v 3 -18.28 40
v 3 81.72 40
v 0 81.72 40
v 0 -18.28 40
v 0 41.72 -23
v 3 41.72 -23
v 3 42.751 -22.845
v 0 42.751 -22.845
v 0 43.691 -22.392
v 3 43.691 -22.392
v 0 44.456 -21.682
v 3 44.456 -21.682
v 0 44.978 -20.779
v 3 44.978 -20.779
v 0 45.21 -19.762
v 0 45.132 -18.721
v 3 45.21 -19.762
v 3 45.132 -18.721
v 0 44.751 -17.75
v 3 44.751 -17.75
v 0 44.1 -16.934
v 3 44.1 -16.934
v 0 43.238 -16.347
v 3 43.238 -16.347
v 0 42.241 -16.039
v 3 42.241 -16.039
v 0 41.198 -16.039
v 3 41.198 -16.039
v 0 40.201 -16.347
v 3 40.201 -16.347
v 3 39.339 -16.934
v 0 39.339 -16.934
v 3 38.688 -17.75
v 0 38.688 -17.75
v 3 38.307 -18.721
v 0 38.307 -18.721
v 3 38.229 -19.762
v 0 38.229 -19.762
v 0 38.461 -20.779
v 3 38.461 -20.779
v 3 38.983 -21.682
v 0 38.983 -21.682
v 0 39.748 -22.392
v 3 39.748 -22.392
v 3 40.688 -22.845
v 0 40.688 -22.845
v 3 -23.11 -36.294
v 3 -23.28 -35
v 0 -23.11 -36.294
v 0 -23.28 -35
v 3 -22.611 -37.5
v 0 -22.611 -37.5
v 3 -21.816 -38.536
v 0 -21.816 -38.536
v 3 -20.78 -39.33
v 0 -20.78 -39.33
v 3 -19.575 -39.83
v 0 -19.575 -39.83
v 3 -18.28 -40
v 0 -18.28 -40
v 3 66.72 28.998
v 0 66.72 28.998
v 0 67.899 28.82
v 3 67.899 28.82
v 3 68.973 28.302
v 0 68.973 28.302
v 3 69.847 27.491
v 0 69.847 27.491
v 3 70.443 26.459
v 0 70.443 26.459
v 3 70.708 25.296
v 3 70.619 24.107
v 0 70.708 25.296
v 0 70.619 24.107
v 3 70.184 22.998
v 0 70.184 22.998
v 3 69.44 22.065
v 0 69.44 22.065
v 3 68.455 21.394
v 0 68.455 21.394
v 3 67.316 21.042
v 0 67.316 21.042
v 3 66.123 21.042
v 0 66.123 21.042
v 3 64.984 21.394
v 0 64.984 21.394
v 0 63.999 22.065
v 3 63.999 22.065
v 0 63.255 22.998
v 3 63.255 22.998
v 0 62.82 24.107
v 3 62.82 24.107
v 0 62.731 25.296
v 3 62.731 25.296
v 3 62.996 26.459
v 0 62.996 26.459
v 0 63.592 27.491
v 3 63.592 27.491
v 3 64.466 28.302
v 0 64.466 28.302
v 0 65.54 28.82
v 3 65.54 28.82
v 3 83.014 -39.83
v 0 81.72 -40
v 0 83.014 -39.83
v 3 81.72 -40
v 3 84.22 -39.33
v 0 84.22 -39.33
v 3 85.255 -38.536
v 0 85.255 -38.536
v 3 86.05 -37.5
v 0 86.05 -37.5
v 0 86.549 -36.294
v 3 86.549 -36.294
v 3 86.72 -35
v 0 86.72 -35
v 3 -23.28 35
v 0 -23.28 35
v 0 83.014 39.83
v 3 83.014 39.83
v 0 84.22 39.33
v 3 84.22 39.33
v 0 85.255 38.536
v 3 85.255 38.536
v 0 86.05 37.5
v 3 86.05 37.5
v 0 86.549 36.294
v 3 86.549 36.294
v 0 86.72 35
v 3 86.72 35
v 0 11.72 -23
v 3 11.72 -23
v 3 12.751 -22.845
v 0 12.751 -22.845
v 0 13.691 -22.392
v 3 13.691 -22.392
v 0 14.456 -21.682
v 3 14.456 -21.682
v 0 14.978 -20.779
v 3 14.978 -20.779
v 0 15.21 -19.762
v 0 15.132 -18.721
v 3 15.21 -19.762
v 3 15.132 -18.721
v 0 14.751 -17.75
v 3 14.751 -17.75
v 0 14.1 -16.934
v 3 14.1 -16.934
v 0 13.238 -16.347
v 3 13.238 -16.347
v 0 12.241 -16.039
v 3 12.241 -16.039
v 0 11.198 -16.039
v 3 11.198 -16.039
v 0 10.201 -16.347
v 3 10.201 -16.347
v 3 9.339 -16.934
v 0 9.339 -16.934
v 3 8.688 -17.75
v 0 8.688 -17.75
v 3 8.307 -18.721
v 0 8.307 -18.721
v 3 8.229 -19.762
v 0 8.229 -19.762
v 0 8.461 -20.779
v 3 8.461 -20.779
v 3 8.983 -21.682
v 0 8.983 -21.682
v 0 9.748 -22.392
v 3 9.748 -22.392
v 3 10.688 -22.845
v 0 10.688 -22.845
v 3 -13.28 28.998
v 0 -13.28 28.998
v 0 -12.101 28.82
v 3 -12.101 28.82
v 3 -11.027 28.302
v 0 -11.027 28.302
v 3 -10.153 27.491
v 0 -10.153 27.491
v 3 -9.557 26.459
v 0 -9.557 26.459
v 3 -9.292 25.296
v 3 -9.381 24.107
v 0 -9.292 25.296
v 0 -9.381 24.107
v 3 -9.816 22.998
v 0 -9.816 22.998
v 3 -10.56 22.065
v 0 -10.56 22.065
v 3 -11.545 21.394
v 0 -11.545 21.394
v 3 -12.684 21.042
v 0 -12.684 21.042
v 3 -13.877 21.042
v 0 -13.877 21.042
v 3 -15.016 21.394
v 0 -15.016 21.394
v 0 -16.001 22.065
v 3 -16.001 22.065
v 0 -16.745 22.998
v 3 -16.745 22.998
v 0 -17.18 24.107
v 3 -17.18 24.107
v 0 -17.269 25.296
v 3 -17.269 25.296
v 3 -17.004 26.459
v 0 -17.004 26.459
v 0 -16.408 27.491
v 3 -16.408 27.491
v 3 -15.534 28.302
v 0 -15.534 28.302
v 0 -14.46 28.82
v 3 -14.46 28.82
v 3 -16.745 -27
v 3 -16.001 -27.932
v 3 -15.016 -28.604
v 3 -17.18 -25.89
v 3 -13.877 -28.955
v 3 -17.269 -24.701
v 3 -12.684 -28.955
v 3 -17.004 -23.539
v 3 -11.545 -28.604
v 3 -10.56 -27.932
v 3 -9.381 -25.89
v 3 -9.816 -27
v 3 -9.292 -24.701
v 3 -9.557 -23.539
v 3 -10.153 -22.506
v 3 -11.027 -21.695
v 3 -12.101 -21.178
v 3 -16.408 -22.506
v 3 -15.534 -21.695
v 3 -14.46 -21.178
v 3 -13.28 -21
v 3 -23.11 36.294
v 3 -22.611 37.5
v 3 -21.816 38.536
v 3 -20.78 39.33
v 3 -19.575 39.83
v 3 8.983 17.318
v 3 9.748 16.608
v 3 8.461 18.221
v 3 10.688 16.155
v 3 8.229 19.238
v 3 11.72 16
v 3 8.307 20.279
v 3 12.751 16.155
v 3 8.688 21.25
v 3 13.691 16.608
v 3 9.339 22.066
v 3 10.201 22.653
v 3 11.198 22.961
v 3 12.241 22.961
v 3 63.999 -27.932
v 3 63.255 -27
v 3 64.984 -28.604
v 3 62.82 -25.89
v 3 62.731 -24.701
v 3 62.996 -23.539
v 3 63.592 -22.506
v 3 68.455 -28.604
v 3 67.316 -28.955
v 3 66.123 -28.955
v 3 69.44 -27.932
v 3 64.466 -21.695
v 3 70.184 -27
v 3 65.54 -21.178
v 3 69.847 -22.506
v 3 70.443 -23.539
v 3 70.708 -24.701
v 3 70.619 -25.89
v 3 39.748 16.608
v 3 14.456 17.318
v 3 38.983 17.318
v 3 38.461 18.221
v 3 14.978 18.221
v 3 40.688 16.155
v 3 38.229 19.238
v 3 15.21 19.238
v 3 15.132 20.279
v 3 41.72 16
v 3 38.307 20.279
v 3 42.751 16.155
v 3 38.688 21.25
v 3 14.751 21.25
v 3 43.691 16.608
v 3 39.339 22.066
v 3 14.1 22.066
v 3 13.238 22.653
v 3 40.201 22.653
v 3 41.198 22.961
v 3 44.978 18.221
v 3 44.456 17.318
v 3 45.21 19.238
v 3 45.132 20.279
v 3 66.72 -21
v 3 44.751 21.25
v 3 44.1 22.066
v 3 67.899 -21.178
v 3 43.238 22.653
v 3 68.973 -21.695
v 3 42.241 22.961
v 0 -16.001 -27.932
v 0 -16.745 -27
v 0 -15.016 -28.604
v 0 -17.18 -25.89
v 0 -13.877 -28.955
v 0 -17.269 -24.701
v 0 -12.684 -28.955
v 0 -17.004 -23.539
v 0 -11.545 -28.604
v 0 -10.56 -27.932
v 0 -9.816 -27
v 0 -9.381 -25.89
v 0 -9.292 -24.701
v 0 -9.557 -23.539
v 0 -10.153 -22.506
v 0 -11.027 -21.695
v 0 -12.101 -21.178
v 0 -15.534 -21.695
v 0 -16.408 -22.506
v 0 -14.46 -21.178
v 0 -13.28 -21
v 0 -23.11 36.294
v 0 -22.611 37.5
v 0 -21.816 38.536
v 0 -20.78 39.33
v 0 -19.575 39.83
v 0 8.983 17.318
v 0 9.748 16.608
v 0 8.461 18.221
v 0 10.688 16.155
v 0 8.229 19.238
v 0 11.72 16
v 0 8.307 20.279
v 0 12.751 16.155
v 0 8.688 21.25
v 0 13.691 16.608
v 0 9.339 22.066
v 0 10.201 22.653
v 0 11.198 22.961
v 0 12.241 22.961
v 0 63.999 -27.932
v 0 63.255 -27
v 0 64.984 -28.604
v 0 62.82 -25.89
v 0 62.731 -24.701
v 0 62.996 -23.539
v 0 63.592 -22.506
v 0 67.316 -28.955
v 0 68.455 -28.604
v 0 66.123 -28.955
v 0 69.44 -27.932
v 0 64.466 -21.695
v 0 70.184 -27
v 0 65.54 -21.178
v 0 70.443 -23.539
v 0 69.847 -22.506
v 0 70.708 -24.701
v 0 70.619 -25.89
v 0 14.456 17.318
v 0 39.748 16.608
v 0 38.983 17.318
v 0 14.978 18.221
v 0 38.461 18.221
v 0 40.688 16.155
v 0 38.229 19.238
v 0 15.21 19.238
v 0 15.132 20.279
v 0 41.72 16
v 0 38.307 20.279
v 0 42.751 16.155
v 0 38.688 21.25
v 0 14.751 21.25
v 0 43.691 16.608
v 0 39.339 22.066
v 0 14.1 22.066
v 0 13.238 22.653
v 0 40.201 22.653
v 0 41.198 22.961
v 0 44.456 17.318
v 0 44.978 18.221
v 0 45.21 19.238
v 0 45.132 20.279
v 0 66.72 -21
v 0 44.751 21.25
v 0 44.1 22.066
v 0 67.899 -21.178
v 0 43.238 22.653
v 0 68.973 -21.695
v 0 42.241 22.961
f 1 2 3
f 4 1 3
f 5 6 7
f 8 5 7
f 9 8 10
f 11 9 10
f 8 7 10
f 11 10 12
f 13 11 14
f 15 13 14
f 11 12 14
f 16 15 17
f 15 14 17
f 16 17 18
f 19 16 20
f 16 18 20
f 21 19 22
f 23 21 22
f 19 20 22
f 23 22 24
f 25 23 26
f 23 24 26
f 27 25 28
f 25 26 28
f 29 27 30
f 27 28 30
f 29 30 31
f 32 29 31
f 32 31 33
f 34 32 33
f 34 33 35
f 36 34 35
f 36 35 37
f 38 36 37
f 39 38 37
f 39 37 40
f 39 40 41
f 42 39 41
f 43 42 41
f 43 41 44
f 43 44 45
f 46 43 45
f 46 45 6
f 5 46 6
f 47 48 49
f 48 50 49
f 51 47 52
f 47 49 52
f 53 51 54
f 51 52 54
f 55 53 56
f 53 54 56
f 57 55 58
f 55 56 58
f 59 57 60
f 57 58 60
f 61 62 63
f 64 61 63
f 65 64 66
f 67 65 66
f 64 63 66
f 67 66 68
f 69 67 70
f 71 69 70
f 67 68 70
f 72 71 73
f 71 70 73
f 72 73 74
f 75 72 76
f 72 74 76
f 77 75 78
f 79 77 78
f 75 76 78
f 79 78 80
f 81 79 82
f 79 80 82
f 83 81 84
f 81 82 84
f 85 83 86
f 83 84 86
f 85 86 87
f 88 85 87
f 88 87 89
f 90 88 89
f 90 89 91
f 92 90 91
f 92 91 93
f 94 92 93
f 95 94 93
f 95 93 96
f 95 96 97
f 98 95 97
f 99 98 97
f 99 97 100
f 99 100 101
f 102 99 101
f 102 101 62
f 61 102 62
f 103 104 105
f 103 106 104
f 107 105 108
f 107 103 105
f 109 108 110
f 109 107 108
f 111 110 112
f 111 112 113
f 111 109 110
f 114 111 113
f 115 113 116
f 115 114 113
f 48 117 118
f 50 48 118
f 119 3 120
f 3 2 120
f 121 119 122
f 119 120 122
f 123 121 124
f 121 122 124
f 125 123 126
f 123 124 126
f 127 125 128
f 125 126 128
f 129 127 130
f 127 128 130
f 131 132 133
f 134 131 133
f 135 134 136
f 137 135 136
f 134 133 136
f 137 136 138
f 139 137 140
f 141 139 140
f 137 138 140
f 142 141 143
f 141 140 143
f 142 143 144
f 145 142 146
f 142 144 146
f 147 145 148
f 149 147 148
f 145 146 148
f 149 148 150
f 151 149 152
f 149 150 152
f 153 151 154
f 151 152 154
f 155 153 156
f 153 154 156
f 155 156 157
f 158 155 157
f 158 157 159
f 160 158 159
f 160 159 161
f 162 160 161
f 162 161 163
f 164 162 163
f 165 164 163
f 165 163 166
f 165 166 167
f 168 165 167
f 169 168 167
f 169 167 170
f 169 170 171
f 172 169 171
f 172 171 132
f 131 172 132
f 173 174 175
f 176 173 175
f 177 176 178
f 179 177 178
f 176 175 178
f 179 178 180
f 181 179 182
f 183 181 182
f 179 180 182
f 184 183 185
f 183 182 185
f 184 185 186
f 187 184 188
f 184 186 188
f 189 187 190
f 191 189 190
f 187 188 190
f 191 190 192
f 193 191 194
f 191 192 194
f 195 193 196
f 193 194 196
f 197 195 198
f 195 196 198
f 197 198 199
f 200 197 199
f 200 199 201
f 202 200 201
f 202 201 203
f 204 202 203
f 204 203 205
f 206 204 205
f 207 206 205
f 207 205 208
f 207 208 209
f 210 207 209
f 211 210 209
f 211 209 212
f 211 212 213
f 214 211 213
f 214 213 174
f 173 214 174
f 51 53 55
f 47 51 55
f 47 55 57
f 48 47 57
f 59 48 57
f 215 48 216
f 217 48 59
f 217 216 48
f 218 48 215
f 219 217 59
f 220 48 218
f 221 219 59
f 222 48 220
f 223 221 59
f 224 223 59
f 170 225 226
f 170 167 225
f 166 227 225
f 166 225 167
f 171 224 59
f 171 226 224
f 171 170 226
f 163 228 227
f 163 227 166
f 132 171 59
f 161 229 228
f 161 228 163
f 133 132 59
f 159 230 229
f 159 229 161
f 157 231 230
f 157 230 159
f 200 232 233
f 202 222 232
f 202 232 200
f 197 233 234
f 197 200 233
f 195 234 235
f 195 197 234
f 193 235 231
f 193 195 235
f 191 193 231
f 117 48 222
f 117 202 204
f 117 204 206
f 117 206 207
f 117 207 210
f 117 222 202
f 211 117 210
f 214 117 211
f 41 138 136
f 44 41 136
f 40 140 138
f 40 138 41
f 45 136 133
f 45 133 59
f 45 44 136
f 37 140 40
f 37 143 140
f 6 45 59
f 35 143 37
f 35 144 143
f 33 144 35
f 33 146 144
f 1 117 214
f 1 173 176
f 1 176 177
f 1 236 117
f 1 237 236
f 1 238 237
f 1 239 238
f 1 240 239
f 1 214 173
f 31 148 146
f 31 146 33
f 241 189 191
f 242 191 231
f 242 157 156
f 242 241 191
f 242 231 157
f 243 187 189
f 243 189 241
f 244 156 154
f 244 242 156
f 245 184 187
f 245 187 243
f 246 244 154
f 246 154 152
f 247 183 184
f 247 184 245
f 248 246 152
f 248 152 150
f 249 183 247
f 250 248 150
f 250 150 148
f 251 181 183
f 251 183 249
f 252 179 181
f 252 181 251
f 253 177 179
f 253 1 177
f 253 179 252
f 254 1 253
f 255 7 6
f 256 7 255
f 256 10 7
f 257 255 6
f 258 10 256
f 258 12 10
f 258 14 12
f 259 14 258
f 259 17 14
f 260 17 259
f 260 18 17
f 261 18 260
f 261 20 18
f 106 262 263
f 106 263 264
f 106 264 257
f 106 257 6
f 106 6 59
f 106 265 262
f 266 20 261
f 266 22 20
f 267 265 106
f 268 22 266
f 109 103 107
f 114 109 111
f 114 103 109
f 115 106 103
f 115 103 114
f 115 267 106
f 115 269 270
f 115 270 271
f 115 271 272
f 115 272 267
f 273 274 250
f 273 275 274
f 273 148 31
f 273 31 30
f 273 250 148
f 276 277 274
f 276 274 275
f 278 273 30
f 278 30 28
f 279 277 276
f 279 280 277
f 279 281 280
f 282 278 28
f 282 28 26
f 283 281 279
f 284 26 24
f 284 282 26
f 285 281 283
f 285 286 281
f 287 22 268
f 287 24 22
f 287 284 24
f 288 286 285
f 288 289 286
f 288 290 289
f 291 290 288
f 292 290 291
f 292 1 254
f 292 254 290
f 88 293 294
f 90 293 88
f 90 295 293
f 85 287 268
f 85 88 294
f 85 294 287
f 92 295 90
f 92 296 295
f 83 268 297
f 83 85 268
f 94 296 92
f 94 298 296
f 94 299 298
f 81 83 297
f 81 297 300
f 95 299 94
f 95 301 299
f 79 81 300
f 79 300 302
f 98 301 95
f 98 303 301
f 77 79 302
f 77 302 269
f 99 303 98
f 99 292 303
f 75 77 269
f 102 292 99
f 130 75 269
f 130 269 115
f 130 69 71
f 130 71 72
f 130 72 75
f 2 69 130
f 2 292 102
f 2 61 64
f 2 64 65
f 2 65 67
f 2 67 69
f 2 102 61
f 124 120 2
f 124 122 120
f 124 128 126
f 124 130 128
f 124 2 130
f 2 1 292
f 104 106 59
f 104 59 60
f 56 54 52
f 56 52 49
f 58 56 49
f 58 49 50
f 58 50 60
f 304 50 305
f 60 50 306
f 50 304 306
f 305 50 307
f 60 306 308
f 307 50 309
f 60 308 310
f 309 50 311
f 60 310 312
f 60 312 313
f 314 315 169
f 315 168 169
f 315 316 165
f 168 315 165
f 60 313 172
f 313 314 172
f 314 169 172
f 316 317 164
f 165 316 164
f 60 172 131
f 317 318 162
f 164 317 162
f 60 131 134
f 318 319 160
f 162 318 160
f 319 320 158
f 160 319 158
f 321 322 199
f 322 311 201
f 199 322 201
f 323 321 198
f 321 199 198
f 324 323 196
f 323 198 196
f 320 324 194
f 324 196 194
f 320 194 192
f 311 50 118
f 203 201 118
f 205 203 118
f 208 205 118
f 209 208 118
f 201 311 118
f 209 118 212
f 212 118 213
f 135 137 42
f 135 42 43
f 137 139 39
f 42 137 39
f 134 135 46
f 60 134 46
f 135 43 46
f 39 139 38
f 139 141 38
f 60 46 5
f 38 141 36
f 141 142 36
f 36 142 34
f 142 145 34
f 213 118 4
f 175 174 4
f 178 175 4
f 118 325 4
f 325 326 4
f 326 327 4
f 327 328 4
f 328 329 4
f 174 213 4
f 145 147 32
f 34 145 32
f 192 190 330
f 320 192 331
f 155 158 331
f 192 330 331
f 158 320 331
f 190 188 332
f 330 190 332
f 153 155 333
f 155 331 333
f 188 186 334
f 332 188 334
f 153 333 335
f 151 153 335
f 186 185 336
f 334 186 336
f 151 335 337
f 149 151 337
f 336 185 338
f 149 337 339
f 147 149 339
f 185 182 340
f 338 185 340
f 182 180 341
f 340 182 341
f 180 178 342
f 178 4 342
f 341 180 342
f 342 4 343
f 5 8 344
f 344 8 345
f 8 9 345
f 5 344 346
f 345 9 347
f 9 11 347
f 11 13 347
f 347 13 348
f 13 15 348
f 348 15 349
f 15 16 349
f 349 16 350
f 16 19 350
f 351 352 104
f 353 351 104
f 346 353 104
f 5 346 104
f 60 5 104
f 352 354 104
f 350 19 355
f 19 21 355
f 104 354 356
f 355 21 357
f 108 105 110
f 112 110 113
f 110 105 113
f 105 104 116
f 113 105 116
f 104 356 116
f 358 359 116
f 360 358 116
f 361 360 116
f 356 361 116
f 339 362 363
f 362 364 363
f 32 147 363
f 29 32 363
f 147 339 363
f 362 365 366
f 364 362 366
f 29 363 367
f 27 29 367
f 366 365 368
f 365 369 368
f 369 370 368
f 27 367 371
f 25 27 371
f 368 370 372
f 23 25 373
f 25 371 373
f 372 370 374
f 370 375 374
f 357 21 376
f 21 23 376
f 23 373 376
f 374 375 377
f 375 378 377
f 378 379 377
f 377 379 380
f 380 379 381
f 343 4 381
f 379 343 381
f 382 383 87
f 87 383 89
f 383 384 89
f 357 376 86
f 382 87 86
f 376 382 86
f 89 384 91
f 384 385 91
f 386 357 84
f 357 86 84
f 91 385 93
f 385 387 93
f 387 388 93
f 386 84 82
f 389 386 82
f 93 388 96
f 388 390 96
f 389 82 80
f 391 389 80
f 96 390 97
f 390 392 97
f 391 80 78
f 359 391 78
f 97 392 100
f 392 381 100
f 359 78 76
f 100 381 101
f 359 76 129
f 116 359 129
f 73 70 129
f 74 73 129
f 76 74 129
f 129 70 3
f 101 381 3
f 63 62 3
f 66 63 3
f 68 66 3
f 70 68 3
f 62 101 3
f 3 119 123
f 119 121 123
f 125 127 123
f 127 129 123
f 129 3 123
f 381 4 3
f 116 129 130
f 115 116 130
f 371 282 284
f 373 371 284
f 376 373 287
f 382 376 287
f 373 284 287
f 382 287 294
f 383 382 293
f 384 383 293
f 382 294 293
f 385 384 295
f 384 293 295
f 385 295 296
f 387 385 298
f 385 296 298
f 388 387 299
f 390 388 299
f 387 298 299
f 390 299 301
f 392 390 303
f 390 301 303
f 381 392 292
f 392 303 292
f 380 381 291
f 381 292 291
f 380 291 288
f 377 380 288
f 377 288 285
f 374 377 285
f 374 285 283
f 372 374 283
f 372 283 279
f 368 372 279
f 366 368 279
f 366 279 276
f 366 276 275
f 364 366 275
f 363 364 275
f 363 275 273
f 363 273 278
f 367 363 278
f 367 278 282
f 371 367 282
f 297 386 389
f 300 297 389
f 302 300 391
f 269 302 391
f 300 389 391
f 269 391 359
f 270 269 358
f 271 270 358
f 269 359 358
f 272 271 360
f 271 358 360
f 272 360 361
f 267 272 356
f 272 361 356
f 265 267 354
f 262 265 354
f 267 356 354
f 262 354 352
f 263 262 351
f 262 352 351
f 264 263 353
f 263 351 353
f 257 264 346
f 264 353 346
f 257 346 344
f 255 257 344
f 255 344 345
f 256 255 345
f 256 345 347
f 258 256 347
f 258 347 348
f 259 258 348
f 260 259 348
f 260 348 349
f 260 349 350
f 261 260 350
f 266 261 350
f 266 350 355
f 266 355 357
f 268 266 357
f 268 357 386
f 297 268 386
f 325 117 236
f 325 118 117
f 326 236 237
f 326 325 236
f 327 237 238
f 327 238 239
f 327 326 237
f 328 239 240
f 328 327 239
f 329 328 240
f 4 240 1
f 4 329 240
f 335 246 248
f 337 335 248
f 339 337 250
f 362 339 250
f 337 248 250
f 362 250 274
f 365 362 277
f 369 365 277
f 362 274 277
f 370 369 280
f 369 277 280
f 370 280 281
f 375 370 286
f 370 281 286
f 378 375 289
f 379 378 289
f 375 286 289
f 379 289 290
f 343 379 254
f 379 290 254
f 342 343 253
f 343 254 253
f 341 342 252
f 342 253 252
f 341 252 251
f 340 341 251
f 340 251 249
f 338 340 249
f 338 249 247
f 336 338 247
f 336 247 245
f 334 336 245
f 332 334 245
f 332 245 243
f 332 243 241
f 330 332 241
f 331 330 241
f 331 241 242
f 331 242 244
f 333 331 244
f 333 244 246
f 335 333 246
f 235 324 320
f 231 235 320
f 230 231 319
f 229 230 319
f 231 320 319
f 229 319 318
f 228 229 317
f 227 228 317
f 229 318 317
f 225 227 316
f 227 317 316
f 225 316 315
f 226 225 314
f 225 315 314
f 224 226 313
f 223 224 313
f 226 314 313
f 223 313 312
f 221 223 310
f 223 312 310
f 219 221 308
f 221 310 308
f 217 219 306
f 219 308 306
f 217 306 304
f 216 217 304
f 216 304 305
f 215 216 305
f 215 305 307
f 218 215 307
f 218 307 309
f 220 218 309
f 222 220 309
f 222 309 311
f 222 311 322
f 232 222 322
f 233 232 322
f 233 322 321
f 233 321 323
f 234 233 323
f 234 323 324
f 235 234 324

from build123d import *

# Parameters (mm, degrees)
BOSS_EXTRUDE1_DEPTH = 40
SKETCH16_R          = 3.5
CUT_EXTRUDE5_DEPTH  = 96.547228328
SKETCH17_R          = 4
CUT_EXTRUDE7_DEPTH  = 96.547228328
FILLET1_R           = 5


with BuildPart() as part:
    # Sketch1 → Boss-Extrude1 (new, symmetric)
    with BuildSketch(Plane.XY):
        Polygon((0, -23.280493307), (0, 86.719506693), (3, 86.719506693), (3, 83.719506693), (3, -23.280493307), align=None)
    extrude(amount=BOSS_EXTRUDE1_DEPTH, both=True)

    # Sketch16 → Cut-Extrude5 (cut, through all)
    with BuildSketch(Plane(origin=(3, 0, 0), x_dir=(0, 0, -1), z_dir=(1, 0, 0))):
        with Locations((-19.5, 11.719506693)):
            Circle(SKETCH16_R)
        with Locations((19.5, 11.719506693)):
            Circle(SKETCH16_R)
        with Locations((19.5, 41.719506693)):
            Circle(SKETCH16_R)
        with Locations((-19.5, 41.719506693)):
            Circle(SKETCH16_R)
    extrude(amount=-CUT_EXTRUDE5_DEPTH, mode=Mode.SUBTRACT)

    # Sketch17 → Cut-Extrude7 (cut, through all)
    with BuildSketch(Plane.ZY):
        with Locations((-25, 66.719506693)):
            Circle(SKETCH17_R)
        with Locations((24.997500187, 66.719506693)):
            Circle(SKETCH17_R)
        with Locations((-25, -13.280493307)):
            Circle(SKETCH17_R)
        with Locations((24.997500187, -13.280493307)):
            Circle(SKETCH17_R)
    extrude(amount=-CUT_EXTRUDE7_DEPTH, mode=Mode.SUBTRACT)

    # Fillet1
    fillet1_edges = [part.edges().sort_by_distance(p)[0] for p in [
        (1.5, 86.719506693, 40),
        (1.5, -23.280493307, 40),
        (1.5, 86.719506693, -40),
        (1.5, -23.280493307, -40),
    ]]
    fillet(fillet1_edges, radius=FILLET1_R)


solid = part.part
